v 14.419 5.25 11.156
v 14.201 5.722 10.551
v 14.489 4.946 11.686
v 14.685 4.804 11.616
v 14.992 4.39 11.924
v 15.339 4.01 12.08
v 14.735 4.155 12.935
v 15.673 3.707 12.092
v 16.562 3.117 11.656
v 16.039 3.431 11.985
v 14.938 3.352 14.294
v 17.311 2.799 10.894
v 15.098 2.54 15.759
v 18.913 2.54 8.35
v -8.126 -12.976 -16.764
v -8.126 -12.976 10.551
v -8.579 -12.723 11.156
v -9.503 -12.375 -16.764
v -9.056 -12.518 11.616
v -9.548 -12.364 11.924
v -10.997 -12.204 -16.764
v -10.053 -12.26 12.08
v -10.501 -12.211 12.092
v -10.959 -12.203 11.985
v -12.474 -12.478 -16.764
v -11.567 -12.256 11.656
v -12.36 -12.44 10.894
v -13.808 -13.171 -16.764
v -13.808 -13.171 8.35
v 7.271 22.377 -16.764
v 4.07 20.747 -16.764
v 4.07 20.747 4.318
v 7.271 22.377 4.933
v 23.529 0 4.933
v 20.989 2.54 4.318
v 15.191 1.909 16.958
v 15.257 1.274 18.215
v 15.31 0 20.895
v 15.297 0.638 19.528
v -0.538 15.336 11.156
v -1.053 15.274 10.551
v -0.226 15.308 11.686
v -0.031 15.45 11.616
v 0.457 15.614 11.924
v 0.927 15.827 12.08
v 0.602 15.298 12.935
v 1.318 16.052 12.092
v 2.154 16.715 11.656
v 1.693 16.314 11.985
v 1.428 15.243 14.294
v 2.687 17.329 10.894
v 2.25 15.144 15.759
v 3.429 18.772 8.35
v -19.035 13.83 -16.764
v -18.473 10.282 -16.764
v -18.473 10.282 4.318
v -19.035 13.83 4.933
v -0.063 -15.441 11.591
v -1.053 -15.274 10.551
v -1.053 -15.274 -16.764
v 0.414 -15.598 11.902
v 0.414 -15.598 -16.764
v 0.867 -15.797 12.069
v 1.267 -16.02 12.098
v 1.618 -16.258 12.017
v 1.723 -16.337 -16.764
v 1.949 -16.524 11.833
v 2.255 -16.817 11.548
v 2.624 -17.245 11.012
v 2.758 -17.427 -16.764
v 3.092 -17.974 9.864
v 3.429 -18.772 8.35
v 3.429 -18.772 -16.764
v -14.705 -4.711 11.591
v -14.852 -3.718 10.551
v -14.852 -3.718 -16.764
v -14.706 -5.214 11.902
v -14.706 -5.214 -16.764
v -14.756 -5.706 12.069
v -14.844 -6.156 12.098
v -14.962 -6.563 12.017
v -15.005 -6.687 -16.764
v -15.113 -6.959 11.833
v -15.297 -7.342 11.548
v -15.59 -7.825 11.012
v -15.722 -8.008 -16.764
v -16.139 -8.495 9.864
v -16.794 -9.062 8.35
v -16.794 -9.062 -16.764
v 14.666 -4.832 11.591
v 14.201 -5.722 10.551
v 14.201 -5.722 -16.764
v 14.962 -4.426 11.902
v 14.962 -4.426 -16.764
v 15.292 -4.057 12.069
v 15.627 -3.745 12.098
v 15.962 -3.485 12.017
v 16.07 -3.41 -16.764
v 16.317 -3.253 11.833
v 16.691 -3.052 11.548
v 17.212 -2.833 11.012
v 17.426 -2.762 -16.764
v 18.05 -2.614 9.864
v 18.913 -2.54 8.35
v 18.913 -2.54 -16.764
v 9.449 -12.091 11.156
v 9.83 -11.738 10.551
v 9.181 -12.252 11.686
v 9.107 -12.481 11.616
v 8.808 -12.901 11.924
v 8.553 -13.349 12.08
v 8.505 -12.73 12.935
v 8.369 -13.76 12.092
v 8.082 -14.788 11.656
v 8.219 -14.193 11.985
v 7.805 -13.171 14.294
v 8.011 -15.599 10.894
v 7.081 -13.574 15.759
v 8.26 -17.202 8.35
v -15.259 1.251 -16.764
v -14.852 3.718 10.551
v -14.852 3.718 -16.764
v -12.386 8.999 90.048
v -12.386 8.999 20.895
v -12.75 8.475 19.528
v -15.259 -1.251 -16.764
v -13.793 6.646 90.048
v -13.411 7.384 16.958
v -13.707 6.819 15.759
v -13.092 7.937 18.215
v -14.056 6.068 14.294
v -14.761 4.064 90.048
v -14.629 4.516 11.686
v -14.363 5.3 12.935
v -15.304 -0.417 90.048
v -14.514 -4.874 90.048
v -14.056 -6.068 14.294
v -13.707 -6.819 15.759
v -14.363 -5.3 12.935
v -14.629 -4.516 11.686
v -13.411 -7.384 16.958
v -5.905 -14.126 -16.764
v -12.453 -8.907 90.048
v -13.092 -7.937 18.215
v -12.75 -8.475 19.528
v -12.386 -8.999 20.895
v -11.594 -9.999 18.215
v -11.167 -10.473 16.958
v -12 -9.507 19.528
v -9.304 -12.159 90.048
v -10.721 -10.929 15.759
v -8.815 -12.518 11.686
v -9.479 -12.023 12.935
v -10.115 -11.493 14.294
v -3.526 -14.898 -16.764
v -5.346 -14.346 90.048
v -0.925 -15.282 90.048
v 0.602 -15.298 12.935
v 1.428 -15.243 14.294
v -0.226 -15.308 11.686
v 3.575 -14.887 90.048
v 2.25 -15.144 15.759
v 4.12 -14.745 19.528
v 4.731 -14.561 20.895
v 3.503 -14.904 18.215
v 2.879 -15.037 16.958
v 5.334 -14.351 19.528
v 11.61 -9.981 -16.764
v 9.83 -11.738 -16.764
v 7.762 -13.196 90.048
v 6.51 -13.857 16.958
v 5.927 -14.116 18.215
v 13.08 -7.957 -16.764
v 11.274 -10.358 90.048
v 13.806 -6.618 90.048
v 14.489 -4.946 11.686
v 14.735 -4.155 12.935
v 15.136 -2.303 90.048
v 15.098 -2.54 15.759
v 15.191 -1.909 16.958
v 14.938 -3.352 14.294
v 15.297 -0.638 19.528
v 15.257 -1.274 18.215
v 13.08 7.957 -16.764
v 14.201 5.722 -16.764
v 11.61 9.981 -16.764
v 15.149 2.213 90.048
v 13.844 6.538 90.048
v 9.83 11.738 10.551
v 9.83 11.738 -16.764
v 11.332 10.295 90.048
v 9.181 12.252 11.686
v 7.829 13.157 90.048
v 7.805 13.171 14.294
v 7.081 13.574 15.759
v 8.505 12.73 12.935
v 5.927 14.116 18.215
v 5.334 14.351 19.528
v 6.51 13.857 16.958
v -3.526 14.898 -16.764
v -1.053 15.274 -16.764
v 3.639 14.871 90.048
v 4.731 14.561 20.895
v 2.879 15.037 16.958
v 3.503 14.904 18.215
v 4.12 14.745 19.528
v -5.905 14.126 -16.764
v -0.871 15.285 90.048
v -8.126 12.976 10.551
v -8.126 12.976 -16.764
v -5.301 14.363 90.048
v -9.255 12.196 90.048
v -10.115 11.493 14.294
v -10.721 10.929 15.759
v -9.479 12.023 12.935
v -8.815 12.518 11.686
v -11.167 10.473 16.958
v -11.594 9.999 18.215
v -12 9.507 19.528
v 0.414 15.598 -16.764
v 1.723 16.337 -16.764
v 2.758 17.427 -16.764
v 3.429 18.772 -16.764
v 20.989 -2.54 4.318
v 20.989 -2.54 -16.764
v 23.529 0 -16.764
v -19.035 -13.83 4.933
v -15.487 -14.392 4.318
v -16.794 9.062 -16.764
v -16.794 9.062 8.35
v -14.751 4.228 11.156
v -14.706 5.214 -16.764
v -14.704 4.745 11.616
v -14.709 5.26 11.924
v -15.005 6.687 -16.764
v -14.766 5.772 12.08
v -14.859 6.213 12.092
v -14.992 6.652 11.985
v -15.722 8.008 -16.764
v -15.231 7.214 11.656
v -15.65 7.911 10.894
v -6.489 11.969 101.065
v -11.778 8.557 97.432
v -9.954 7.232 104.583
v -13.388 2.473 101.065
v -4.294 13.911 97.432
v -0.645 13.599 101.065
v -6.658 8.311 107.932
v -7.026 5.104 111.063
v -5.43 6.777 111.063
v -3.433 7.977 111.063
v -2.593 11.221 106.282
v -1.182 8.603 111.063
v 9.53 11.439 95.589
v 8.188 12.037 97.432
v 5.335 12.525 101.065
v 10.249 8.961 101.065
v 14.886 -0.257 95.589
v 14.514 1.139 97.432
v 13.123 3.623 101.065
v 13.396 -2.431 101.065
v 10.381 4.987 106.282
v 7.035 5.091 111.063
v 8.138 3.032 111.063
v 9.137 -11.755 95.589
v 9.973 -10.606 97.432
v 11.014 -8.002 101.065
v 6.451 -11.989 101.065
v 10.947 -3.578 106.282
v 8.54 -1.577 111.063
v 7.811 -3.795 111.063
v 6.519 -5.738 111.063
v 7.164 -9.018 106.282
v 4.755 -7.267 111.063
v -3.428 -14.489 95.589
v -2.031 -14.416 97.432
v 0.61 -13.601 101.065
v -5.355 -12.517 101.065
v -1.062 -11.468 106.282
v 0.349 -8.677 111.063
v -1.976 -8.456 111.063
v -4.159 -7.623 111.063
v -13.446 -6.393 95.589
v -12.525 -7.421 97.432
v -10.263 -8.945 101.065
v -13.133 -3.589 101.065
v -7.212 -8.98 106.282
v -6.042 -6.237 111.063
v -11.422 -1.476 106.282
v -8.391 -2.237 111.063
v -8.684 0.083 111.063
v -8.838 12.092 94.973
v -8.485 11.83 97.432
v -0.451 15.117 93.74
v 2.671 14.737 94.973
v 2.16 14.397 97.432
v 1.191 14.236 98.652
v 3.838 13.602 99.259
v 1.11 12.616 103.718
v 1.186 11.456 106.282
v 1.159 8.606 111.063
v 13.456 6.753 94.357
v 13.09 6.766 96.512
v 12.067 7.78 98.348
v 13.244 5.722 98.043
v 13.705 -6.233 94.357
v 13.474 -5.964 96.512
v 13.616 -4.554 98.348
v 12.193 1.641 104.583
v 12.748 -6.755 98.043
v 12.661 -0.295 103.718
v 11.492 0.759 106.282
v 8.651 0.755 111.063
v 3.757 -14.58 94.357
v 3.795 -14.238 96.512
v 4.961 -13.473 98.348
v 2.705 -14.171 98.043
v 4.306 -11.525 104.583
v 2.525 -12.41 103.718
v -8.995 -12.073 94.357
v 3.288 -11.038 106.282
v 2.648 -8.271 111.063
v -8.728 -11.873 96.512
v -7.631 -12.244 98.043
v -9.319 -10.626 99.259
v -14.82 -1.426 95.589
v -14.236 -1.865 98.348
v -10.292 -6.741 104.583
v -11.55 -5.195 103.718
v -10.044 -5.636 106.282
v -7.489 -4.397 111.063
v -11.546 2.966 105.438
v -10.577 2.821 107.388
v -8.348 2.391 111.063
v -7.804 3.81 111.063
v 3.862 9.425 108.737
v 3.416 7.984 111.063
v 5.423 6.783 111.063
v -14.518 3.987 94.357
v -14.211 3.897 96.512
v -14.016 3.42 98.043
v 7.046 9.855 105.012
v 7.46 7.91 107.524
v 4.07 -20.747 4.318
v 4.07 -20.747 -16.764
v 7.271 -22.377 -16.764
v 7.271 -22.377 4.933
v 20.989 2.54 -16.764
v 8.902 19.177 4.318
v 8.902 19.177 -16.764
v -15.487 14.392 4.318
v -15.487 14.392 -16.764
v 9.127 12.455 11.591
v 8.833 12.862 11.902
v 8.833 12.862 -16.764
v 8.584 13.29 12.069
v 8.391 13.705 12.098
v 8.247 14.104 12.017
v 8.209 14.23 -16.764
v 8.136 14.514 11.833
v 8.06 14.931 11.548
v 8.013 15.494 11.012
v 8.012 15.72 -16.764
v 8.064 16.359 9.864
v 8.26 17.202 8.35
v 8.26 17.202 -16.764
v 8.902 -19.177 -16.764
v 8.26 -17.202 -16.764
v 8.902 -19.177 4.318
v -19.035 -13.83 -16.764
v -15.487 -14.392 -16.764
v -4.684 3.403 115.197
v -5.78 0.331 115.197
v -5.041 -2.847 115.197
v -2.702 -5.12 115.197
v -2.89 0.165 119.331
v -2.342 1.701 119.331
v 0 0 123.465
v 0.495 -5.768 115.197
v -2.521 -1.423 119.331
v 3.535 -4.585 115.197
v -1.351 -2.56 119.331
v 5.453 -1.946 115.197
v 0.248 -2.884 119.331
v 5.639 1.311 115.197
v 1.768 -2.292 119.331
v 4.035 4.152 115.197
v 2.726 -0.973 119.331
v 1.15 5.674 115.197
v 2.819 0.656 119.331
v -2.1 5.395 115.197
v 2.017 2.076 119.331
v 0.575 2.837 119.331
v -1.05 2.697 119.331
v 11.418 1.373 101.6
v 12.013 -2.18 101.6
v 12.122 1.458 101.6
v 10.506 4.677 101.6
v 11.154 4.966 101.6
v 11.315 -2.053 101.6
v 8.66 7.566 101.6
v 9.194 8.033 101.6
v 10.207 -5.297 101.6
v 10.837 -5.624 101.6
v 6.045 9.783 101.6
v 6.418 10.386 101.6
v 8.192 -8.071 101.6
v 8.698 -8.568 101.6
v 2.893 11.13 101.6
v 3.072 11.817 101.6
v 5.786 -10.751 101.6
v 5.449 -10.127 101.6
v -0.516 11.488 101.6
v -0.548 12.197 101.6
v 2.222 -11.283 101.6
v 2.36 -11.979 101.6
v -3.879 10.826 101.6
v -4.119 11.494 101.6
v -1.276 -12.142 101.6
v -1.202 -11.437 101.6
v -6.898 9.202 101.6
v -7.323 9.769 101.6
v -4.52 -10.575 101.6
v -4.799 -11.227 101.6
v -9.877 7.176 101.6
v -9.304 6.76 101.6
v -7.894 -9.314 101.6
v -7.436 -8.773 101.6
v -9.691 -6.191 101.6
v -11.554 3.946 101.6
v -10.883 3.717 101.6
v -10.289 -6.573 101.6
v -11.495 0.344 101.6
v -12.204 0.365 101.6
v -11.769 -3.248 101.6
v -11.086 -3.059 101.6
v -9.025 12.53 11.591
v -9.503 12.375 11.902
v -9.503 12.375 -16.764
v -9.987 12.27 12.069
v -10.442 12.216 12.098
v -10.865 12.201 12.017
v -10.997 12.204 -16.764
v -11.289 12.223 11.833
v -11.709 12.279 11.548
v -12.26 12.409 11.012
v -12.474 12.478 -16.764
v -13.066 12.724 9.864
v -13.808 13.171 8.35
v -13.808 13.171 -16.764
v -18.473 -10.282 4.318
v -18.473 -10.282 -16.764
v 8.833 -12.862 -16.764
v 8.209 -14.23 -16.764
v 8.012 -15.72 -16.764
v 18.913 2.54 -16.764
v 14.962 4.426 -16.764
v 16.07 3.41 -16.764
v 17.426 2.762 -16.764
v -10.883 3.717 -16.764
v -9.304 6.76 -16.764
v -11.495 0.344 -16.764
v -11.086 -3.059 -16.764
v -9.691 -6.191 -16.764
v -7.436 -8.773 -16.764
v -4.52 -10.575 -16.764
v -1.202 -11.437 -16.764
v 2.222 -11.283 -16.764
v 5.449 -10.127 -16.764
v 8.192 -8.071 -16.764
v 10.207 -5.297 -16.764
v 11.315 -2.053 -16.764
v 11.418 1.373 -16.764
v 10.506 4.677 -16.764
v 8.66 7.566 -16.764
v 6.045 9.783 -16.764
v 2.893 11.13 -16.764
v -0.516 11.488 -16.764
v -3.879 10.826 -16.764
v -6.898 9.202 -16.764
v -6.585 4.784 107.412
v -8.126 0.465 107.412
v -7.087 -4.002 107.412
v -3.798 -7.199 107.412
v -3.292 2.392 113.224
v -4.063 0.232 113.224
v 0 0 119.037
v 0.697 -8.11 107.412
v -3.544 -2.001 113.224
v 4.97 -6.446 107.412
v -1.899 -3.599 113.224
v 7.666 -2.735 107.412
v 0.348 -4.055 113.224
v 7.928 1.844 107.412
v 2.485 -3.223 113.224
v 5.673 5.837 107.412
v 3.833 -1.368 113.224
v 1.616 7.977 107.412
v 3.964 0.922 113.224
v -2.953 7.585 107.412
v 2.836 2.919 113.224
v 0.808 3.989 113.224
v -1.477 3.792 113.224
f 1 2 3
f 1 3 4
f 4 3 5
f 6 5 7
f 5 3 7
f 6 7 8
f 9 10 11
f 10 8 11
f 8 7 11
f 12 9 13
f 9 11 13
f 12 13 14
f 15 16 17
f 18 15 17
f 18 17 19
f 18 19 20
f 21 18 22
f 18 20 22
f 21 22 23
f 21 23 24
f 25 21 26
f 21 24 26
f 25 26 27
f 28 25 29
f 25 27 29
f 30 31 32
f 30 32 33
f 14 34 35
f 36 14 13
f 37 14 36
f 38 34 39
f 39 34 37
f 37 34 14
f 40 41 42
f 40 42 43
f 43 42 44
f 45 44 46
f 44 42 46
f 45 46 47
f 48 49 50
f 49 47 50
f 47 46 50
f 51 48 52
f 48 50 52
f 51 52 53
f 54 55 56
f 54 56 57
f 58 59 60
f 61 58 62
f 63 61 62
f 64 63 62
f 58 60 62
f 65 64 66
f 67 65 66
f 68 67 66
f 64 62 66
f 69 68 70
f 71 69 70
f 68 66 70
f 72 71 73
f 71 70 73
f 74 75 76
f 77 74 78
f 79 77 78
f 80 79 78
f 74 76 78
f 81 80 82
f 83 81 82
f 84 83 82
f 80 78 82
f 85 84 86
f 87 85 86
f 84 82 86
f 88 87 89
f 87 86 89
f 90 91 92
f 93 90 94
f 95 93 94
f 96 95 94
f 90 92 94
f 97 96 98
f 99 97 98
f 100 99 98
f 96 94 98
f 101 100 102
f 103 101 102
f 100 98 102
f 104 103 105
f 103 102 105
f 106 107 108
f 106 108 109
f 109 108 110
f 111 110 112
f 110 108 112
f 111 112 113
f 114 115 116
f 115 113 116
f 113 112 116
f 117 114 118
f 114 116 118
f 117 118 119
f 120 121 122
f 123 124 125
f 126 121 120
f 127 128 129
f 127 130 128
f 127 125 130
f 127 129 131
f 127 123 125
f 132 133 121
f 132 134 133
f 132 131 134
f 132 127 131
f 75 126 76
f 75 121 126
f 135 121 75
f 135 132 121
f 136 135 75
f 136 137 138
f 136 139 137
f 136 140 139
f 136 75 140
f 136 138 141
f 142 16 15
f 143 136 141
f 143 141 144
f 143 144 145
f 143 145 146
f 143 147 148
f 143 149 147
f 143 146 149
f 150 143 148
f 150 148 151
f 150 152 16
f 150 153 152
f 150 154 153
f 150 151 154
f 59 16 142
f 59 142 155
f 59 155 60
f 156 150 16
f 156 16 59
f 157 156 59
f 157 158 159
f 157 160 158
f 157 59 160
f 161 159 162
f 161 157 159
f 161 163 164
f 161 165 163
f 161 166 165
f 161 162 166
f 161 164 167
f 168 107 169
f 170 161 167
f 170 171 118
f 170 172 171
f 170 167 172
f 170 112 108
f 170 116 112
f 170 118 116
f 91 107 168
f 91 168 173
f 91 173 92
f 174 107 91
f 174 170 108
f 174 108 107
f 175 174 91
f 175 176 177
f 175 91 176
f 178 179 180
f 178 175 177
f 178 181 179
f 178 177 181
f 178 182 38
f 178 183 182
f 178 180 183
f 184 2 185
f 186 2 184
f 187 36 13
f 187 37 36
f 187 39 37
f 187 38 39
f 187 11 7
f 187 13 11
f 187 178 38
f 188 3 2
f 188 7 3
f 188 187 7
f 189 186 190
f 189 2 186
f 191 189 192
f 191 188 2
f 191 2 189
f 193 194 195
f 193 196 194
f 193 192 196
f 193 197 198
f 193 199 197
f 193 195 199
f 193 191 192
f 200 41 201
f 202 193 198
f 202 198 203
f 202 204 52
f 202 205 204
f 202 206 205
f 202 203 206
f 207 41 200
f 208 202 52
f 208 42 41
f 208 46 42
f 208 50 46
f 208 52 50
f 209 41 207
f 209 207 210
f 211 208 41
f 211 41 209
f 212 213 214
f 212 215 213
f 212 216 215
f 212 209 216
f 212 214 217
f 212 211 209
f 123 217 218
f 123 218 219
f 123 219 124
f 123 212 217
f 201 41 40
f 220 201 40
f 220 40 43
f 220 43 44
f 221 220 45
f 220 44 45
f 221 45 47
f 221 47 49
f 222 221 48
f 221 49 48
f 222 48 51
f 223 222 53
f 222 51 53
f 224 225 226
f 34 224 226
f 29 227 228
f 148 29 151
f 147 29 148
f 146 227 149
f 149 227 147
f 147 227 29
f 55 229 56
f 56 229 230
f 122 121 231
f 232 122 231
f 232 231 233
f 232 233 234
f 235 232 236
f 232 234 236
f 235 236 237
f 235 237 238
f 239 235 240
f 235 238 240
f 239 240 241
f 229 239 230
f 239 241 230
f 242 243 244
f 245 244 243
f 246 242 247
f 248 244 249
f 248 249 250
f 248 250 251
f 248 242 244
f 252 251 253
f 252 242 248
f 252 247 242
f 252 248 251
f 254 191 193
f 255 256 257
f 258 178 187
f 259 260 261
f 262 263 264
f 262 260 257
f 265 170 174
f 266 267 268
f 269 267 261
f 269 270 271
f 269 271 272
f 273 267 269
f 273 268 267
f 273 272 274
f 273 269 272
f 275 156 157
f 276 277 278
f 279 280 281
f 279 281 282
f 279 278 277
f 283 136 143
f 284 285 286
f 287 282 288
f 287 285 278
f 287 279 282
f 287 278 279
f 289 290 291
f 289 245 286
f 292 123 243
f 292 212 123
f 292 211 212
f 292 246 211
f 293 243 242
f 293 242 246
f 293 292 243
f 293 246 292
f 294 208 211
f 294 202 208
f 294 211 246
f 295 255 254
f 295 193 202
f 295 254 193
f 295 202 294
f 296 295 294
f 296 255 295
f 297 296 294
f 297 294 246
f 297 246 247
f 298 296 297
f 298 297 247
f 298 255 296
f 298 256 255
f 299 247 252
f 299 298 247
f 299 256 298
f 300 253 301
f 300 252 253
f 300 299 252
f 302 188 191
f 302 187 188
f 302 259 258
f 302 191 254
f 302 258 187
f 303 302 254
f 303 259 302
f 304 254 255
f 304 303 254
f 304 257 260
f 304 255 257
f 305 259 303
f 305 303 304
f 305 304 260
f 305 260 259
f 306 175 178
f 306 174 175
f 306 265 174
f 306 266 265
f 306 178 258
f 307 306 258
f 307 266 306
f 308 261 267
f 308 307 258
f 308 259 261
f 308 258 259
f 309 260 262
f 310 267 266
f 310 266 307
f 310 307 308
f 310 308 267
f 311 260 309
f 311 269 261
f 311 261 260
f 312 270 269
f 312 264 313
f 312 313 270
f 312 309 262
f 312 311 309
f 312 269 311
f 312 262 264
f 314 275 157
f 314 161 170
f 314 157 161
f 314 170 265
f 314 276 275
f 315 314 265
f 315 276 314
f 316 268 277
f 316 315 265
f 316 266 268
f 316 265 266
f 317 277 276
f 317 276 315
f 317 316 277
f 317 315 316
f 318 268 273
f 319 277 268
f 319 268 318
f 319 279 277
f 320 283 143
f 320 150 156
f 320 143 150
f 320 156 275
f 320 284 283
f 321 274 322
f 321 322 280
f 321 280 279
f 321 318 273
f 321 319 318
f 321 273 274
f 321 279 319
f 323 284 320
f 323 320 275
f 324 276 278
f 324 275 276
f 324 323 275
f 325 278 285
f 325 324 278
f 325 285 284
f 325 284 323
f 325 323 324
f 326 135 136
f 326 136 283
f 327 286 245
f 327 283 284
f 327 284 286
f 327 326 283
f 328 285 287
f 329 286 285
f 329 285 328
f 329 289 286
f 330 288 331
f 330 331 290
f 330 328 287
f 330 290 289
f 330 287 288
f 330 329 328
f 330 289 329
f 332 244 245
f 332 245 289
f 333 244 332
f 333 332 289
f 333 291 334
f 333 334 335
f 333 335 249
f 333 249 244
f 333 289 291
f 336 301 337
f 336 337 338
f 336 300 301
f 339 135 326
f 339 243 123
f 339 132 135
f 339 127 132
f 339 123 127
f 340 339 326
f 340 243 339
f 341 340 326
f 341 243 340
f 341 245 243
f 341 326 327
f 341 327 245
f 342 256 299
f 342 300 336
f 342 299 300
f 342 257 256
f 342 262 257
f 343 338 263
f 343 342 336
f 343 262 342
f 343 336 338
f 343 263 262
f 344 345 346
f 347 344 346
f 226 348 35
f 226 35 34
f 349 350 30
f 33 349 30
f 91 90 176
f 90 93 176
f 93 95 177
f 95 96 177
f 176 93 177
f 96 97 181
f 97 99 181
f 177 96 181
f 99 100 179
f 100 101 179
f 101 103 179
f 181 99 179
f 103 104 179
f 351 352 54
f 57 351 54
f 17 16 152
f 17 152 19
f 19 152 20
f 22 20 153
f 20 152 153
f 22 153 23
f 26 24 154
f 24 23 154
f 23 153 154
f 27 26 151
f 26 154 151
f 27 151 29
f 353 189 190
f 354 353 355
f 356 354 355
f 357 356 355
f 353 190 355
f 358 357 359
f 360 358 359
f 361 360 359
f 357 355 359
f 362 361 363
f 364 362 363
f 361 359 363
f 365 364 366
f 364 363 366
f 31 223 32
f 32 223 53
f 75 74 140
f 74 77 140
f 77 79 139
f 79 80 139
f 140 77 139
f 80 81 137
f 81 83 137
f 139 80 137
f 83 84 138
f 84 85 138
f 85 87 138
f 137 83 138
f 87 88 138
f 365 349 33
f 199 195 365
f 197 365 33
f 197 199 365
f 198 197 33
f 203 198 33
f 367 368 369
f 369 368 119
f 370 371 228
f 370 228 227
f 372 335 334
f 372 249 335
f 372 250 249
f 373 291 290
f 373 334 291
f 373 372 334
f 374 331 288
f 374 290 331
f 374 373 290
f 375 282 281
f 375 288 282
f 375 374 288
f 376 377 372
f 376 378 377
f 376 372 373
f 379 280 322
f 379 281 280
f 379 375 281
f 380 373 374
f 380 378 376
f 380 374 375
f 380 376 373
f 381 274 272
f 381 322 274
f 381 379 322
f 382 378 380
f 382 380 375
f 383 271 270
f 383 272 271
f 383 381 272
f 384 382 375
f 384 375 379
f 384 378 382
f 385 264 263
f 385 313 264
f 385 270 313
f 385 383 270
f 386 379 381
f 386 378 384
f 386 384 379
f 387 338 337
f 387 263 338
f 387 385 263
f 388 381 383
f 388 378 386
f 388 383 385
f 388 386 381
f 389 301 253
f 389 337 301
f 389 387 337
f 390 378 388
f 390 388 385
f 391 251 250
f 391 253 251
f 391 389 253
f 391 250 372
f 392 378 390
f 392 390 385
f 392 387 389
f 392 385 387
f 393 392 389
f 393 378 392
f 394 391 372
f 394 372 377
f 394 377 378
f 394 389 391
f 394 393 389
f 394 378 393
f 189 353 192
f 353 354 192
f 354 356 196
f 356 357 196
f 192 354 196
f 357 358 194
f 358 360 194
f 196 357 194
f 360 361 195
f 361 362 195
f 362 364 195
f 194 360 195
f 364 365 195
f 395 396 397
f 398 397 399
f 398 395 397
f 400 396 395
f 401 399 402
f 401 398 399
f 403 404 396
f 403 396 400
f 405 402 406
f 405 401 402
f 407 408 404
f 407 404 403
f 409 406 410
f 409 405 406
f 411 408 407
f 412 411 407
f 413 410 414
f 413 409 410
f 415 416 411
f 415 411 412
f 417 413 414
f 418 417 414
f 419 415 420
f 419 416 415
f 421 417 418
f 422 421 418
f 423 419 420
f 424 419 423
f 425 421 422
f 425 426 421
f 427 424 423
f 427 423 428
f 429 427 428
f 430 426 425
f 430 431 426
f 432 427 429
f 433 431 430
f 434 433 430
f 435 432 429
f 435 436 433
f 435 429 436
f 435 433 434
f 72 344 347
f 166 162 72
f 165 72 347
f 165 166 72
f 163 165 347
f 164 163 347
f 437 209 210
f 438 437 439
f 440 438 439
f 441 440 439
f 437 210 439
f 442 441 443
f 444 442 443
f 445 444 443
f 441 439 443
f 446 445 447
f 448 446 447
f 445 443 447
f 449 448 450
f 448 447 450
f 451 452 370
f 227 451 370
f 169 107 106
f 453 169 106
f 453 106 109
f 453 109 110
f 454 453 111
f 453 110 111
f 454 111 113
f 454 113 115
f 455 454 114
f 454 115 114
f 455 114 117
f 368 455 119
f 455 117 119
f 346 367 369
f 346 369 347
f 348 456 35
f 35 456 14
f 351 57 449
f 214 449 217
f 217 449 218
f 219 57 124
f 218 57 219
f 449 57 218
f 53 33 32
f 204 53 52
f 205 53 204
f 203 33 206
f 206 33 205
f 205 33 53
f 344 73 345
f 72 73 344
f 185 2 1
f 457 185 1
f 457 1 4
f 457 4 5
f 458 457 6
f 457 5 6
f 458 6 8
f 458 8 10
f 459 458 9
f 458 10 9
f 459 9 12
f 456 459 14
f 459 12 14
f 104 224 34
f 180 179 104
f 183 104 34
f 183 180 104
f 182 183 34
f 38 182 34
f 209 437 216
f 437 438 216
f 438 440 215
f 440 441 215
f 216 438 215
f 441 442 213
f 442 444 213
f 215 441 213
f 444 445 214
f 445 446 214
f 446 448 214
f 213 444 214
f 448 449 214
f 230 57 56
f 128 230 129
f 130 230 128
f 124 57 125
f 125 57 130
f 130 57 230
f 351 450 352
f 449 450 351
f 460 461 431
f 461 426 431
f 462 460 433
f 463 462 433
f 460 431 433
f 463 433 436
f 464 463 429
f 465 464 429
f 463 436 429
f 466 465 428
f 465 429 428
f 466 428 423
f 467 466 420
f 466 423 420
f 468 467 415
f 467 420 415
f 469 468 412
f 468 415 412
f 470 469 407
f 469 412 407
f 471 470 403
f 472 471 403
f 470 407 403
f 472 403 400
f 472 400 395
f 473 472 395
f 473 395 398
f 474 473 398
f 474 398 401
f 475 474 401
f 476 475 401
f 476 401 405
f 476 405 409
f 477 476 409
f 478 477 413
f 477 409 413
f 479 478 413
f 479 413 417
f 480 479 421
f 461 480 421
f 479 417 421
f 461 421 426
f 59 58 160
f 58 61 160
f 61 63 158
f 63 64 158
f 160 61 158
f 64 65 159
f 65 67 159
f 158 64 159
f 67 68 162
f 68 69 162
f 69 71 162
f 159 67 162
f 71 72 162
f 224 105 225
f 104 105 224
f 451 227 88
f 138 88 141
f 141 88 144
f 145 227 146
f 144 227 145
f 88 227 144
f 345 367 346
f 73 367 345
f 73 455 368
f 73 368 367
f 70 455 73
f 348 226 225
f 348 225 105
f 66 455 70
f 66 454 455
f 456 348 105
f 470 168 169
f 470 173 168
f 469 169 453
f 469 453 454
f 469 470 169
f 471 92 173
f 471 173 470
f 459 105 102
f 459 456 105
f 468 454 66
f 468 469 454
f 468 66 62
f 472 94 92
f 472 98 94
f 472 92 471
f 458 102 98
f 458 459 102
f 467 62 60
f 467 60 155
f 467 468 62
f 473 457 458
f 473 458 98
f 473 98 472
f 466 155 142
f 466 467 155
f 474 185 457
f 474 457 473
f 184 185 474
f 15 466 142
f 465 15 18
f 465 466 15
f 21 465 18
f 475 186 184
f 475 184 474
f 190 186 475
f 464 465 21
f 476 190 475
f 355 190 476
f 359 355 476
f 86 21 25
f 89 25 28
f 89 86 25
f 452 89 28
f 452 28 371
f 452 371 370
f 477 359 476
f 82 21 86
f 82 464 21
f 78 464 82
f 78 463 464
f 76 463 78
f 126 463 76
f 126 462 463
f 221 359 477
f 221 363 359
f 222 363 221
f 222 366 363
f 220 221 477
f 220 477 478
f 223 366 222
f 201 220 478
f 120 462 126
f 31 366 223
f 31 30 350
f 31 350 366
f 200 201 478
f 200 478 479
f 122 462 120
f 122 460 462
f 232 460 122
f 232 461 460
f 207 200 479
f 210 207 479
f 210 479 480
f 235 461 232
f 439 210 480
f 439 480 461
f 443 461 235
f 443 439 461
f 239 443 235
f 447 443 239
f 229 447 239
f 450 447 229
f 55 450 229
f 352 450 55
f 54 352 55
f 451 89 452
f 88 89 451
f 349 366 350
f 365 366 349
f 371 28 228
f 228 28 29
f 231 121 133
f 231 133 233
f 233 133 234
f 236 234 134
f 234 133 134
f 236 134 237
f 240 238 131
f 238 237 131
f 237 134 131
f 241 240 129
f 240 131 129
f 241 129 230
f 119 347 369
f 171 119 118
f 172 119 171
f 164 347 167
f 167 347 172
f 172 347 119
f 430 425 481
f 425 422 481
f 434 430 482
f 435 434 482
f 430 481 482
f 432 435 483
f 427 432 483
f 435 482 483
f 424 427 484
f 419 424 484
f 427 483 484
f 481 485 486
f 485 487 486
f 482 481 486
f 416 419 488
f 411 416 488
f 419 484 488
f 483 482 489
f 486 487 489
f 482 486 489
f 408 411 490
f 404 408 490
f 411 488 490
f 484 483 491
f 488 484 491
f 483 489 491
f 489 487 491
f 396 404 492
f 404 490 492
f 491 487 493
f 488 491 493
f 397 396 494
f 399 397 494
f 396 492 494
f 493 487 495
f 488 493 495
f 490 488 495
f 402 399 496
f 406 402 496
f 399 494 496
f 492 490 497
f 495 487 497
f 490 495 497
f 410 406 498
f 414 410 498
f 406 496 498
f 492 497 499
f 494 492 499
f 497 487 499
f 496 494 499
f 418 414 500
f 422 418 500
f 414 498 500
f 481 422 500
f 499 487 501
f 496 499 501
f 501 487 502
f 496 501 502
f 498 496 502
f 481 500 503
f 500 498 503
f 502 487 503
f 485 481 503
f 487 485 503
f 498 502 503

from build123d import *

# Parameters (mm, degrees)
F0_R          = 15.31
F0_R_2        = 11.5
F1_DEPTH      = 101.6
F2_DEPTH      = 25.4
F3_DEPTH      = 25.4
F4_DEPTH      = 25.4
F5_DEPTH      = 25.4
F6_R          = 15.31
F7_DEPTH      = 25.4
F7_TAPER      = 35
F8_T          = 2.54
F10_DEPTH     = 2.54
F11_DEPTH     = 10.668
F12_COUNT     = 5
F14_SIZE      = 2.5399
F15_DEPTH     = 25.4
F16_T1_DEPTH  = 31.2479879022
F16_T3_DEPTH  = 26.3887057153
F16_T5_DEPTH  = 18.1838383234
F16_T7_DEPTH  = 38.4641495789
F17_DEPTH     = 19.304
F18_R         = 36.6377921473
F19_T1_DEPTH  = 6.096
F19_T6_DEPTH  = 35.9639195383
F19_T11_DEPTH = 35.9639195383
F19_T16_DEPTH = 35.9639195383
F19_T21_DEPTH = 35.9639195383
F19_T26_DEPTH = 35.9639195383
F19_T31_DEPTH = 35.9639195383
F19_T36_DEPTH = 35.9639195383
F19_T41_DEPTH = 35.9639195383
F19_T46_DEPTH = 35.9639195383
F19_T51_DEPTH = 35.9639195383


# Not quite as in the source:
# - a fillet or chamfer that OpenCascade refuses, or shapes differently, is made with other operations: its cross-section is extruded or revolved along the edge and cut away or added
# - a fillet or chamfer is up to 0.001 mm smaller than in the source, because OpenCascade refuses the exact size
# - a shell that OpenCascade refuses in one call is made with other operations: the cavity is built on its own and cut out


with BuildPart() as f1:
    # F0 (on Top) → F1 (new body)
    with BuildSketch(Plane.XY):
        Circle(F0_R)
        Circle(F0_R_2, mode=Mode.SUBTRACT)
    extrude(amount=F1_DEPTH)

    # F2 (add): a face of the model
    f2_faces = [f1.faces().sort_by_distance(p)[0] for p in [
        (-14.8769678072, 0, 101.6),
    ]]
    extrude(f2_faces, amount=F2_DEPTH)

    # F3 (cut): a face of the model
    f3_faces = [f1.faces().sort_by_distance(p)[0] for p in [
        (-14.8769678072, 0, 127),
    ]]
    extrude(f3_faces, amount=-F3_DEPTH, mode=Mode.SUBTRACT)

    # F4 (add): a face of the model
    f4_faces = [f1.faces().sort_by_distance(p)[0] for p in [
        (-14.8769678072, 0, 101.6),
    ]]
    extrude(f4_faces, amount=F4_DEPTH)

    # F5 (cut): a face of the model
    f5_faces = [f1.faces().sort_by_distance(p)[0] for p in [
        (-14.8769678072, 0, 127),
    ]]
    extrude(f5_faces, amount=-F5_DEPTH, mode=Mode.SUBTRACT)

    # F6 (on face) → F7 (join)
    with BuildSketch(Plane.XY.offset(101.6)):
        Circle(F6_R)
    extrude(amount=F7_DEPTH, taper=F7_TAPER)

    # F8: shell of thickness 2.54, made by hand


with BuildPart() as f8_core1:
    # F8_t2: copy of F1
    add(f1.part)

    # the walls: a layer under each face that stays
    f8_faces = [f8_core1.faces().sort_by_distance(p)[0] for p in [
        (-15.31, 0, 50.8),
        (-7.655, 0, 112.5324729916),
        (-10.2066666667, -10.2066666667, 0),
        (-11.5, 0, 50.8),
    ]]
    thicken(f8_faces, amount=-F8_T, mode=Mode.SUBTRACT)


with BuildPart() as f1_1:
    add(f1.part)

    # what is left inside the walls is the cavity
    f8_cavity = [f8_core1.part.solids().sort_by_distance(p)[0] for p in [
        (-8.118682, 0, 107.397628),
    ]]
    add(f8_cavity, mode=Mode.SUBTRACT)

    # F9 (on Front) → F10 (join, symmetric)
    with BuildSketch(Plane.XZ):
        Polygon((26.068892777, 0), (12.5377972627, 26.279142328), (12.7, 0), align=None)
    extrude(amount=F10_DEPTH, both=True)

    # F11 (add): a face of the model
    f11_faces = [f1_1.faces().sort_by_distance(p)[0] for p in [
        (-14.7952381942, 0, 0),
    ]]
    extrude(f11_faces, amount=F11_DEPTH)


with BuildPart() as f12_1:
    # F12: instance of F1
    add(f1_1.part.rotate(Axis((0, 0, 0), (0, 0, 1)), 1 * 360 / F12_COUNT))


with BuildPart() as f12_2:
    # F12: instance of F1
    add(f1_1.part.rotate(Axis((0, 0, 0), (0, 0, 1)), 2 * 360 / F12_COUNT))


with BuildPart() as f12_3:
    # F12: instance of F1
    add(f1_1.part.rotate(Axis((0, 0, 0), (0, 0, 1)), 3 * 360 / F12_COUNT))


with BuildPart() as f12_4:
    # F12: instance of F1
    add(f1_1.part.rotate(Axis((0, 0, 0), (0, 0, 1)), 4 * 360 / F12_COUNT))


with BuildPart() as f12_2_1:
    add(f12_2.part)

    # F13: union F12_1, F1, F12_4, F12_3
    add(f12_1.part)
    add(f1_1.part)
    add(f12_4.part)
    add(f12_3.part)

    # F14 (size 2.54 in the source; OpenCascade refuses exactly that, so slightly less here)
    f14_edges = [f12_2_1.edges().sort_by_distance(p)[0] for p in [
        (20.583362, 2.54, 10.653612),
        (20.583362, -2.54, 10.653612),
        (8.776292, 18.791037, 10.653612),
        (3.944925, 20.360844, 10.653612),
        (-15.159315, 14.1535, 10.653612),
        (-18.145264, 10.043693, 10.653612),
        (-18.145264, -10.043693, 10.653612),
        (-15.159315, -14.1535, 10.653612),
        (8.776292, -18.791037, 10.653612),
        (3.944925, -20.360844, 10.653612),
    ]]
    chamfer(f14_edges, length=F14_SIZE)

    # F15 (add): a face of the model
    f15_faces = [f12_2_1.faces().sort_by_distance(p)[0] for p in [
        (-4.5128934655, 13.8892579239, -10.668),
    ]]
    extrude(f15_faces, amount=F15_DEPTH)

    # F16: chamfer of 5.08 on 13 edges, made by hand

    # F16_s2 → F16_t1 (cut)
    with BuildSketch(Plane.XY.offset(-23.7321495789)):
        Polygon((-15.4873964089, 14.391864802), (-22.583151822, 13.2680075522), (-19.5972027403, 17.3778138836), align=None)
        Polygon((-18.4733454905, 10.2820584706), (-19.5972027403, 17.3778138836), (-22.583151822, 13.2680075522), align=None)
        Polygon((-15.4873964089, -14.391864802), (-22.583151822, -13.2680075522), (-19.5972027403, -17.3778138836), align=None)
        Polygon((-18.4733454905, -10.2820584706), (-19.5972027403, -17.3778138836), (-22.583151822, -13.2680075522), align=None)
        Polygon((8.9016081126, -19.1767200797), (5.6400473412, -25.5778935139), (10.471414444, -24.0080871825), align=None)
        Polygon((4.0702410098, -20.7465264111), (10.471414444, -24.0080871825), (5.6400473412, -25.5778935139), align=None)
        Polygon((4.0702410098, 20.7465264111), (10.471414444, 24.0080871825), (5.6400473412, 25.5778935139), align=None)
        Polygon((8.9016081126, 19.1767200797), (5.6400473412, 25.5778935139), (10.471414444, 24.0080871825), align=None)
    extrude(amount=F16_T1_DEPTH, mode=Mode.SUBTRACT)

    # F16_s4 → F16_t3 (cut)
    with BuildSketch(Plane.XZ.offset(-13.1943528576)):
        Polygon((23.7433758033, 4.5164555577), (26.068892777, -5.08), (26.068892777, 0), align=None)
    extrude(amount=F16_T3_DEPTH, mode=Mode.SUBTRACT)

    # F16_s6 → F16_t5 (cut)
    with BuildSketch(Plane.XY.offset(-10.668)):
        Polygon((20.988892777, -2.54), (26.068892777, 2.54), (26.068892777, -2.54), align=None)
        Polygon((20.988892777, 2.54), (26.068892777, -2.54), (26.068892777, 2.54), align=None)
    extrude(amount=F16_T5_DEPTH, mode=Mode.SUBTRACT)

    # F16_s8 → F16_t7 (cut)
    with BuildSketch(Plane.XY.offset(-49.1321495789)):
        Polygon((20.988892777, -2.54), (26.068892777, 2.54), (26.068892777, -2.54), align=None)
        Polygon((20.988892777, 2.54), (26.068892777, -2.54), (26.068892777, 2.54), align=None)
    extrude(amount=F16_T7_DEPTH, mode=Mode.SUBTRACT)

    # F17 (cut): a face of the model
    f17_faces = [f12_2_1.faces().sort_by_distance(p)[0] for p in [
        (4.599928622, 20.1480200473, -36.068),
    ]]
    extrude(f17_faces, amount=-F17_DEPTH, mode=Mode.SUBTRACT)

    # F18
    f18_edges = [f12_2_1.edges().sort_by_distance(p)[0] for p in [
        (12.38605, -8.998992, 101.6),
    ]]
    fillet(f18_edges, radius=F18_R)

    # F19: fillet of radius 5.08 on 27 edges, made by hand

    # F19_s2 → F19_t1 (join)
    with BuildSketch(Plane.XY.offset(-16.764)):
        with BuildLine():
            ThreePointArc((14.2007070375, 5.7215399706), (16.0699037533, 3.4098588533), (18.9126333439, 2.54))
            Line((18.9126333439, 2.54), (15.09783097, 2.54))
            ThreePointArc((15.09783097, 2.54), (14.7353870492, 4.1550533702), (14.2007070375, 5.7215399706))
        make_face()
        with BuildLine():
            ThreePointArc((14.2007070375, -5.7215399706), (16.0699037533, -3.4098588533), (18.9126333439, -2.54))
            Line((18.9126333439, -2.54), (15.09783097, -2.54))
            ThreePointArc((15.09783097, -2.54), (14.7353870492, -4.1550533702), (14.2007070375, -5.7215399706))
        make_face()
        with BuildLine():
            ThreePointArc((-8.1255765104, 12.975789239), (-10.996560488, 12.2042861927), (-13.8076672428, 13.1714701273))
            Line((-13.8076672428, 13.1714701273), (-10.7214272921, 10.9291855515))
            ThreePointArc((-10.7214272921, 10.9291855515), (-9.4788994481, 12.0227519834), (-8.1255765104, 12.975789239))
        make_face()
        with BuildLine():
            ThreePointArc((-1.0532480655, 15.2737280489), (1.7229048756, 16.3370910149), (3.4286415603, 18.7718863477))
            Line((3.4286415603, 18.7718863477), (2.2498027966, 15.1437936917))
            ThreePointArc((2.2498027966, 15.1437936917), (0.6017944337, 15.2981679772), (-1.0532480655, 15.2737280489))
        make_face()
        with BuildLine():
            ThreePointArc((-14.8516501406, -3.7181430986), (-15.0050899808, -6.6870186712), (-16.7936163244, -9.0616637958))
            Line((-16.7936163244, -9.0616637958), (-13.7073763738, -6.8193792201))
            ThreePointArc((-13.7073763738, -6.8193792201), (-14.363457635, -5.2997344054), (-14.8516501406, -3.7181430986))
        make_face()
        with BuildLine():
            ThreePointArc((-14.8516501406, 3.7181430986), (-15.0050899808, 6.6870186712), (-16.7936163244, 9.0616637958))
            Line((-16.7936163244, 9.0616637958), (-13.7073763738, 6.8193792201))
            ThreePointArc((-13.7073763738, 6.8193792201), (-14.363457635, 5.2997344054), (-14.8516501406, 3.7181430986))
        make_face()
        with BuildLine():
            ThreePointArc((9.829767679, 11.7376218791), (8.2088418399, 14.2296823467), (8.260008663, 17.2020800163))
            Line((8.260008663, 17.2020800163), (7.0811698993, 13.5739873603))
            ThreePointArc((7.0811698993, 13.5739873603), (8.5051756002, 12.7302037694), (9.829767679, 11.7376218791))
        make_face()
        with BuildLine():
            ThreePointArc((-1.0532480655, -15.2737280489), (1.7229048756, -16.3370910149), (3.4286415603, -18.7718863477))
            Line((3.4286415603, -18.7718863477), (2.2498027966, -15.1437936917))
            ThreePointArc((2.2498027966, -15.1437936917), (0.6017944337, -15.2981679772), (-1.0532480655, -15.2737280489))
        make_face()
        with BuildLine():
            ThreePointArc((-8.1255765104, -12.975789239), (-10.996560488, -12.2042861927), (-13.8076672428, -13.1714701273))
            Line((-13.8076672428, -13.1714701273), (-10.7214272921, -10.9291855515))
            ThreePointArc((-10.7214272921, -10.9291855515), (-9.4788994481, -12.0227519834), (-8.1255765104, -12.975789239))
        make_face()
        with BuildLine():
            ThreePointArc((9.829767679, -11.7376218791), (8.2088418399, -14.2296823467), (8.260008663, -17.2020800163))
            Line((8.260008663, -17.2020800163), (7.0811698993, -13.5739873603))
            ThreePointArc((7.0811698993, -13.5739873603), (8.5051756002, -12.7302037694), (9.829767679, -11.7376218791))
        make_face()
    extrude(amount=F19_T1_DEPTH)


with BuildPart() as f19_tool4:
    # F19_s5 → F19_t6 (new body)
    with BuildSketch(Plane.XY.offset(-10.668)):
        with BuildLine():
            ThreePointArc((-8.1255765104, 12.975789239), (-10.996560488, 12.2042861927), (-13.8076672428, 13.1714701273))
            Line((-13.8076672428, 13.1714701273), (-10.7214272921, 10.9291855515))
            ThreePointArc((-10.7214272921, 10.9291855515), (-9.4788994481, 12.0227519834), (-8.1255765104, 12.975789239))
        make_face()
    extrude(amount=F19_T6_DEPTH)

    split(bisect_by=Plane(origin=(-1.5237102008, 15.4312558291, 5.3049866361), x_dir=(0.9951603879, 0.0982639424, 0), z_dir=(0.0929734367, -0.9415812046, -0.323698587)), keep=Keep.TOP)


with BuildPart() as f12_2_2:
    add(f12_2_1.part)

    # F19_t3: union F19_tool4
    add(f19_tool4.part)


with BuildPart() as f19_tool9:
    # F19_s10 → F19_t11 (new body)
    with BuildSketch(Plane.XY.offset(25.2959195383)):
        with BuildLine():
            ThreePointArc((-14.8516501406, 3.7181430986), (-15.0050899808, 6.6870186712), (-16.7936163244, 9.0616637958))
            Line((-16.7936163244, 9.0616637958), (-13.7073763738, 6.8193792201))
            ThreePointArc((-13.7073763738, 6.8193792201), (-14.363457635, 5.2997344054), (-14.8516501406, 3.7181430986))
        make_face()
    extrude(amount=-F19_T11_DEPTH)

    split(bisect_by=Plane(origin=(-15.1468487575, -3.3193857803, 5.3049866361), x_dir=(-0.2140669092, 0.9768189998, 0), z_dir=(0.9242273122, 0.202541601, -0.323698587)), keep=Keep.TOP)


with BuildPart() as f12_2_3:
    add(f12_2_2.part)

    # F19_t8: union F19_tool9
    add(f19_tool9.part)


with BuildPart() as f19_tool14:
    # F19_s15 → F19_t16 (new body)
    with BuildSketch(Plane.XY.offset(25.2959195383)):
        with BuildLine():
            ThreePointArc((-1.0532480655, 15.2737280489), (1.7229048756, 16.3370910149), (3.4286415603, 18.7718863477))
            Line((3.4286415603, 18.7718863477), (2.2498027966, 15.1437936917))
            ThreePointArc((2.2498027966, 15.1437936917), (0.6017944337, 15.2981679772), (-1.0532480655, 15.2737280489))
        make_face()
    extrude(amount=-F19_T16_DEPTH)

    split(bisect_by=Plane(origin=(-7.8375571537, 13.3797625951, 5.3049866361), x_dir=(0.8628597621, 0.5054434003, 0), z_dir=(0.4782304556, -0.816403611, -0.323698587)), keep=Keep.TOP)


with BuildPart() as f12_2_4:
    add(f12_2_3.part)

    # F19_t13: union F19_tool14
    add(f19_tool14.part)


with BuildPart() as f19_tool19:
    # F19_s20 → F19_t21 (new body)
    with BuildSketch(Plane.XY.offset(-10.668)):
        with BuildLine():
            ThreePointArc((-14.8516501406, -3.7181430986), (-15.0050899808, -6.6870186712), (-16.7936163244, -9.0616637958))
            Line((-16.7936163244, -9.0616637958), (-13.7073763738, -6.8193792201))
            ThreePointArc((-13.7073763738, -6.8193792201), (-14.363457635, -5.2997344054), (-14.8516501406, -3.7181430986))
        make_face()
    extrude(amount=F19_T21_DEPTH)

    split(bisect_by=Plane(origin=(-15.1468487575, 3.3193857803, 5.3049866361), x_dir=(0.2140669092, 0.9768189998, 0), z_dir=(0.9242273122, -0.202541601, -0.323698587)), keep=Keep.TOP)


with BuildPart() as f12_2_5:
    add(f12_2_4.part)

    # F19_t18: union F19_tool19
    add(f19_tool19.part)


with BuildPart() as f19_tool24:
    # F19_s25 → F19_t26 (new body)
    with BuildSketch(Plane.XY.offset(-10.668)):
        with BuildLine():
            ThreePointArc((9.829767679, 11.7376218791), (8.2088418399, 14.2296823467), (8.260008663, 17.2020800163))
            Line((8.260008663, 17.2020800163), (7.0811698993, 13.5739873603))
            ThreePointArc((7.0811698993, 13.5739873603), (8.5051756002, 12.7302037694), (9.829767679, 11.7376218791))
        make_face()
    extrude(amount=F19_T26_DEPTH)

    split(bisect_by=Plane(origin=(14.2051440643, 6.2176548112, 5.3049866361), x_dir=(0.4009760348, -0.9160885435, 0), z_dir=(-0.8667665683, -0.3793875866, -0.323698587)), keep=Keep.TOP)


with BuildPart() as f12_2_6:
    add(f12_2_5.part)

    # F19_t23: union F19_tool24
    add(f19_tool24.part)


with BuildPart() as f19_tool29:
    # F19_s30 → F19_t31 (new body)
    with BuildSketch(Plane.XY.offset(25.2959195383)):
        with BuildLine():
            ThreePointArc((-8.1255765104, -12.975789239), (-10.996560488, -12.2042861927), (-13.8076672428, -13.1714701273))
            Line((-13.8076672428, -13.1714701273), (-10.7214272921, -10.9291855515))
            ThreePointArc((-10.7214272921, -10.9291855515), (-9.4788994481, -12.0227519834), (-8.1255765104, -12.975789239))
        make_face()
    extrude(amount=-F19_T31_DEPTH)

    split(bisect_by=Plane(origin=(-1.5237102008, -15.4312558291, 5.3049866361), x_dir=(-0.9951603879, 0.0982639424, 0), z_dir=(0.0929734367, 0.9415812046, -0.323698587)), keep=Keep.TOP)


with BuildPart() as f12_2_7:
    add(f12_2_6.part)

    # F19_t28: union F19_tool29
    add(f19_tool29.part)


with BuildPart() as f19_tool34:
    # F19_s35 → F19_t36 (new body)
    with BuildSketch(Plane.XY.offset(25.2959195383)):
        with BuildLine():
            ThreePointArc((14.2007070375, 5.7215399706), (16.0699037533, 3.4098588533), (18.9126333439, 2.54))
            Line((18.9126333439, 2.54), (15.09783097, 2.54))
            ThreePointArc((15.09783097, 2.54), (14.7353870492, 4.1550533702), (14.2007070375, 5.7215399706))
        make_face()
    extrude(amount=-F19_T36_DEPTH)

    split(bisect_by=Plane(origin=(10.3029720477, 11.5885338255, 5.3049866361), x_dir=(0.7473435697, -0.664437799, 0), z_dir=(-0.6286646362, -0.7071067812, -0.323698587)), keep=Keep.TOP)


with BuildPart() as f12_2_8:
    add(f12_2_7.part)

    # F19_t33: union F19_tool34
    add(f19_tool34.part)


with BuildPart() as f19_tool39:
    # F19_s40 → F19_t41 (new body)
    with BuildSketch(Plane.XY.offset(-10.668)):
        with BuildLine():
            ThreePointArc((-1.0532480655, -15.2737280489), (1.7229048756, -16.3370910149), (3.4286415603, -18.7718863477))
            Line((3.4286415603, -18.7718863477), (2.2498027966, -15.1437936917))
            ThreePointArc((2.2498027966, -15.1437936917), (0.6017944337, -15.2981679772), (-1.0532480655, -15.2737280489))
        make_face()
    extrude(amount=F19_T41_DEPTH)

    split(bisect_by=Plane(origin=(-7.8375571537, -13.3797625951, 5.3049866361), x_dir=(-0.8628597621, 0.5054434003, 0), z_dir=(0.4782304556, 0.816403611, -0.323698587)), keep=Keep.TOP)


with BuildPart() as f12_2_9:
    add(f12_2_8.part)

    # F19_t38: union F19_tool39
    add(f19_tool39.part)


with BuildPart() as f19_tool44:
    # F19_s45 → F19_t46 (new body)
    with BuildSketch(Plane.XY.offset(-10.668)):
        with BuildLine():
            ThreePointArc((14.2007070375, -5.7215399706), (16.0699037533, -3.4098588533), (18.9126333439, -2.54))
            Line((18.9126333439, -2.54), (15.09783097, -2.54))
            ThreePointArc((15.09783097, -2.54), (14.7353870492, -4.1550533702), (14.2007070375, -5.7215399706))
        make_face()
    extrude(amount=F19_T46_DEPTH)

    split(bisect_by=Plane(origin=(10.3029720477, -11.5885338255, 5.3049866361), x_dir=(-0.7473435697, -0.664437799, 0), z_dir=(-0.6286646362, 0.7071067812, -0.323698587)), keep=Keep.TOP)


with BuildPart() as f12_2_10:
    add(f12_2_9.part)

    # F19_t43: union F19_tool44
    add(f19_tool44.part)


with BuildPart() as f19_tool49:
    # F19_s50 → F19_t51 (new body)
    with BuildSketch(Plane.XY.offset(25.2959195383)):
        with BuildLine():
            ThreePointArc((9.829767679, -11.7376218791), (8.2088418399, -14.2296823467), (8.260008663, -17.2020800163))
            Line((8.260008663, -17.2020800163), (7.0811698993, -13.5739873603))
            ThreePointArc((7.0811698993, -13.5739873603), (8.5051756002, -12.7302037694), (9.829767679, -11.7376218791))
        make_face()
    extrude(amount=-F19_T51_DEPTH)

    split(bisect_by=Plane(origin=(14.2051440643, -6.2176548112, 5.3049866361), x_dir=(-0.4009760348, -0.9160885435, 0), z_dir=(-0.8667665683, 0.3793875866, -0.323698587)), keep=Keep.TOP)


with BuildPart() as f12_2_11:
    add(f12_2_10.part)

    # F19_t48: union F19_tool49
    add(f19_tool49.part)


solid = f12_2_11.part
